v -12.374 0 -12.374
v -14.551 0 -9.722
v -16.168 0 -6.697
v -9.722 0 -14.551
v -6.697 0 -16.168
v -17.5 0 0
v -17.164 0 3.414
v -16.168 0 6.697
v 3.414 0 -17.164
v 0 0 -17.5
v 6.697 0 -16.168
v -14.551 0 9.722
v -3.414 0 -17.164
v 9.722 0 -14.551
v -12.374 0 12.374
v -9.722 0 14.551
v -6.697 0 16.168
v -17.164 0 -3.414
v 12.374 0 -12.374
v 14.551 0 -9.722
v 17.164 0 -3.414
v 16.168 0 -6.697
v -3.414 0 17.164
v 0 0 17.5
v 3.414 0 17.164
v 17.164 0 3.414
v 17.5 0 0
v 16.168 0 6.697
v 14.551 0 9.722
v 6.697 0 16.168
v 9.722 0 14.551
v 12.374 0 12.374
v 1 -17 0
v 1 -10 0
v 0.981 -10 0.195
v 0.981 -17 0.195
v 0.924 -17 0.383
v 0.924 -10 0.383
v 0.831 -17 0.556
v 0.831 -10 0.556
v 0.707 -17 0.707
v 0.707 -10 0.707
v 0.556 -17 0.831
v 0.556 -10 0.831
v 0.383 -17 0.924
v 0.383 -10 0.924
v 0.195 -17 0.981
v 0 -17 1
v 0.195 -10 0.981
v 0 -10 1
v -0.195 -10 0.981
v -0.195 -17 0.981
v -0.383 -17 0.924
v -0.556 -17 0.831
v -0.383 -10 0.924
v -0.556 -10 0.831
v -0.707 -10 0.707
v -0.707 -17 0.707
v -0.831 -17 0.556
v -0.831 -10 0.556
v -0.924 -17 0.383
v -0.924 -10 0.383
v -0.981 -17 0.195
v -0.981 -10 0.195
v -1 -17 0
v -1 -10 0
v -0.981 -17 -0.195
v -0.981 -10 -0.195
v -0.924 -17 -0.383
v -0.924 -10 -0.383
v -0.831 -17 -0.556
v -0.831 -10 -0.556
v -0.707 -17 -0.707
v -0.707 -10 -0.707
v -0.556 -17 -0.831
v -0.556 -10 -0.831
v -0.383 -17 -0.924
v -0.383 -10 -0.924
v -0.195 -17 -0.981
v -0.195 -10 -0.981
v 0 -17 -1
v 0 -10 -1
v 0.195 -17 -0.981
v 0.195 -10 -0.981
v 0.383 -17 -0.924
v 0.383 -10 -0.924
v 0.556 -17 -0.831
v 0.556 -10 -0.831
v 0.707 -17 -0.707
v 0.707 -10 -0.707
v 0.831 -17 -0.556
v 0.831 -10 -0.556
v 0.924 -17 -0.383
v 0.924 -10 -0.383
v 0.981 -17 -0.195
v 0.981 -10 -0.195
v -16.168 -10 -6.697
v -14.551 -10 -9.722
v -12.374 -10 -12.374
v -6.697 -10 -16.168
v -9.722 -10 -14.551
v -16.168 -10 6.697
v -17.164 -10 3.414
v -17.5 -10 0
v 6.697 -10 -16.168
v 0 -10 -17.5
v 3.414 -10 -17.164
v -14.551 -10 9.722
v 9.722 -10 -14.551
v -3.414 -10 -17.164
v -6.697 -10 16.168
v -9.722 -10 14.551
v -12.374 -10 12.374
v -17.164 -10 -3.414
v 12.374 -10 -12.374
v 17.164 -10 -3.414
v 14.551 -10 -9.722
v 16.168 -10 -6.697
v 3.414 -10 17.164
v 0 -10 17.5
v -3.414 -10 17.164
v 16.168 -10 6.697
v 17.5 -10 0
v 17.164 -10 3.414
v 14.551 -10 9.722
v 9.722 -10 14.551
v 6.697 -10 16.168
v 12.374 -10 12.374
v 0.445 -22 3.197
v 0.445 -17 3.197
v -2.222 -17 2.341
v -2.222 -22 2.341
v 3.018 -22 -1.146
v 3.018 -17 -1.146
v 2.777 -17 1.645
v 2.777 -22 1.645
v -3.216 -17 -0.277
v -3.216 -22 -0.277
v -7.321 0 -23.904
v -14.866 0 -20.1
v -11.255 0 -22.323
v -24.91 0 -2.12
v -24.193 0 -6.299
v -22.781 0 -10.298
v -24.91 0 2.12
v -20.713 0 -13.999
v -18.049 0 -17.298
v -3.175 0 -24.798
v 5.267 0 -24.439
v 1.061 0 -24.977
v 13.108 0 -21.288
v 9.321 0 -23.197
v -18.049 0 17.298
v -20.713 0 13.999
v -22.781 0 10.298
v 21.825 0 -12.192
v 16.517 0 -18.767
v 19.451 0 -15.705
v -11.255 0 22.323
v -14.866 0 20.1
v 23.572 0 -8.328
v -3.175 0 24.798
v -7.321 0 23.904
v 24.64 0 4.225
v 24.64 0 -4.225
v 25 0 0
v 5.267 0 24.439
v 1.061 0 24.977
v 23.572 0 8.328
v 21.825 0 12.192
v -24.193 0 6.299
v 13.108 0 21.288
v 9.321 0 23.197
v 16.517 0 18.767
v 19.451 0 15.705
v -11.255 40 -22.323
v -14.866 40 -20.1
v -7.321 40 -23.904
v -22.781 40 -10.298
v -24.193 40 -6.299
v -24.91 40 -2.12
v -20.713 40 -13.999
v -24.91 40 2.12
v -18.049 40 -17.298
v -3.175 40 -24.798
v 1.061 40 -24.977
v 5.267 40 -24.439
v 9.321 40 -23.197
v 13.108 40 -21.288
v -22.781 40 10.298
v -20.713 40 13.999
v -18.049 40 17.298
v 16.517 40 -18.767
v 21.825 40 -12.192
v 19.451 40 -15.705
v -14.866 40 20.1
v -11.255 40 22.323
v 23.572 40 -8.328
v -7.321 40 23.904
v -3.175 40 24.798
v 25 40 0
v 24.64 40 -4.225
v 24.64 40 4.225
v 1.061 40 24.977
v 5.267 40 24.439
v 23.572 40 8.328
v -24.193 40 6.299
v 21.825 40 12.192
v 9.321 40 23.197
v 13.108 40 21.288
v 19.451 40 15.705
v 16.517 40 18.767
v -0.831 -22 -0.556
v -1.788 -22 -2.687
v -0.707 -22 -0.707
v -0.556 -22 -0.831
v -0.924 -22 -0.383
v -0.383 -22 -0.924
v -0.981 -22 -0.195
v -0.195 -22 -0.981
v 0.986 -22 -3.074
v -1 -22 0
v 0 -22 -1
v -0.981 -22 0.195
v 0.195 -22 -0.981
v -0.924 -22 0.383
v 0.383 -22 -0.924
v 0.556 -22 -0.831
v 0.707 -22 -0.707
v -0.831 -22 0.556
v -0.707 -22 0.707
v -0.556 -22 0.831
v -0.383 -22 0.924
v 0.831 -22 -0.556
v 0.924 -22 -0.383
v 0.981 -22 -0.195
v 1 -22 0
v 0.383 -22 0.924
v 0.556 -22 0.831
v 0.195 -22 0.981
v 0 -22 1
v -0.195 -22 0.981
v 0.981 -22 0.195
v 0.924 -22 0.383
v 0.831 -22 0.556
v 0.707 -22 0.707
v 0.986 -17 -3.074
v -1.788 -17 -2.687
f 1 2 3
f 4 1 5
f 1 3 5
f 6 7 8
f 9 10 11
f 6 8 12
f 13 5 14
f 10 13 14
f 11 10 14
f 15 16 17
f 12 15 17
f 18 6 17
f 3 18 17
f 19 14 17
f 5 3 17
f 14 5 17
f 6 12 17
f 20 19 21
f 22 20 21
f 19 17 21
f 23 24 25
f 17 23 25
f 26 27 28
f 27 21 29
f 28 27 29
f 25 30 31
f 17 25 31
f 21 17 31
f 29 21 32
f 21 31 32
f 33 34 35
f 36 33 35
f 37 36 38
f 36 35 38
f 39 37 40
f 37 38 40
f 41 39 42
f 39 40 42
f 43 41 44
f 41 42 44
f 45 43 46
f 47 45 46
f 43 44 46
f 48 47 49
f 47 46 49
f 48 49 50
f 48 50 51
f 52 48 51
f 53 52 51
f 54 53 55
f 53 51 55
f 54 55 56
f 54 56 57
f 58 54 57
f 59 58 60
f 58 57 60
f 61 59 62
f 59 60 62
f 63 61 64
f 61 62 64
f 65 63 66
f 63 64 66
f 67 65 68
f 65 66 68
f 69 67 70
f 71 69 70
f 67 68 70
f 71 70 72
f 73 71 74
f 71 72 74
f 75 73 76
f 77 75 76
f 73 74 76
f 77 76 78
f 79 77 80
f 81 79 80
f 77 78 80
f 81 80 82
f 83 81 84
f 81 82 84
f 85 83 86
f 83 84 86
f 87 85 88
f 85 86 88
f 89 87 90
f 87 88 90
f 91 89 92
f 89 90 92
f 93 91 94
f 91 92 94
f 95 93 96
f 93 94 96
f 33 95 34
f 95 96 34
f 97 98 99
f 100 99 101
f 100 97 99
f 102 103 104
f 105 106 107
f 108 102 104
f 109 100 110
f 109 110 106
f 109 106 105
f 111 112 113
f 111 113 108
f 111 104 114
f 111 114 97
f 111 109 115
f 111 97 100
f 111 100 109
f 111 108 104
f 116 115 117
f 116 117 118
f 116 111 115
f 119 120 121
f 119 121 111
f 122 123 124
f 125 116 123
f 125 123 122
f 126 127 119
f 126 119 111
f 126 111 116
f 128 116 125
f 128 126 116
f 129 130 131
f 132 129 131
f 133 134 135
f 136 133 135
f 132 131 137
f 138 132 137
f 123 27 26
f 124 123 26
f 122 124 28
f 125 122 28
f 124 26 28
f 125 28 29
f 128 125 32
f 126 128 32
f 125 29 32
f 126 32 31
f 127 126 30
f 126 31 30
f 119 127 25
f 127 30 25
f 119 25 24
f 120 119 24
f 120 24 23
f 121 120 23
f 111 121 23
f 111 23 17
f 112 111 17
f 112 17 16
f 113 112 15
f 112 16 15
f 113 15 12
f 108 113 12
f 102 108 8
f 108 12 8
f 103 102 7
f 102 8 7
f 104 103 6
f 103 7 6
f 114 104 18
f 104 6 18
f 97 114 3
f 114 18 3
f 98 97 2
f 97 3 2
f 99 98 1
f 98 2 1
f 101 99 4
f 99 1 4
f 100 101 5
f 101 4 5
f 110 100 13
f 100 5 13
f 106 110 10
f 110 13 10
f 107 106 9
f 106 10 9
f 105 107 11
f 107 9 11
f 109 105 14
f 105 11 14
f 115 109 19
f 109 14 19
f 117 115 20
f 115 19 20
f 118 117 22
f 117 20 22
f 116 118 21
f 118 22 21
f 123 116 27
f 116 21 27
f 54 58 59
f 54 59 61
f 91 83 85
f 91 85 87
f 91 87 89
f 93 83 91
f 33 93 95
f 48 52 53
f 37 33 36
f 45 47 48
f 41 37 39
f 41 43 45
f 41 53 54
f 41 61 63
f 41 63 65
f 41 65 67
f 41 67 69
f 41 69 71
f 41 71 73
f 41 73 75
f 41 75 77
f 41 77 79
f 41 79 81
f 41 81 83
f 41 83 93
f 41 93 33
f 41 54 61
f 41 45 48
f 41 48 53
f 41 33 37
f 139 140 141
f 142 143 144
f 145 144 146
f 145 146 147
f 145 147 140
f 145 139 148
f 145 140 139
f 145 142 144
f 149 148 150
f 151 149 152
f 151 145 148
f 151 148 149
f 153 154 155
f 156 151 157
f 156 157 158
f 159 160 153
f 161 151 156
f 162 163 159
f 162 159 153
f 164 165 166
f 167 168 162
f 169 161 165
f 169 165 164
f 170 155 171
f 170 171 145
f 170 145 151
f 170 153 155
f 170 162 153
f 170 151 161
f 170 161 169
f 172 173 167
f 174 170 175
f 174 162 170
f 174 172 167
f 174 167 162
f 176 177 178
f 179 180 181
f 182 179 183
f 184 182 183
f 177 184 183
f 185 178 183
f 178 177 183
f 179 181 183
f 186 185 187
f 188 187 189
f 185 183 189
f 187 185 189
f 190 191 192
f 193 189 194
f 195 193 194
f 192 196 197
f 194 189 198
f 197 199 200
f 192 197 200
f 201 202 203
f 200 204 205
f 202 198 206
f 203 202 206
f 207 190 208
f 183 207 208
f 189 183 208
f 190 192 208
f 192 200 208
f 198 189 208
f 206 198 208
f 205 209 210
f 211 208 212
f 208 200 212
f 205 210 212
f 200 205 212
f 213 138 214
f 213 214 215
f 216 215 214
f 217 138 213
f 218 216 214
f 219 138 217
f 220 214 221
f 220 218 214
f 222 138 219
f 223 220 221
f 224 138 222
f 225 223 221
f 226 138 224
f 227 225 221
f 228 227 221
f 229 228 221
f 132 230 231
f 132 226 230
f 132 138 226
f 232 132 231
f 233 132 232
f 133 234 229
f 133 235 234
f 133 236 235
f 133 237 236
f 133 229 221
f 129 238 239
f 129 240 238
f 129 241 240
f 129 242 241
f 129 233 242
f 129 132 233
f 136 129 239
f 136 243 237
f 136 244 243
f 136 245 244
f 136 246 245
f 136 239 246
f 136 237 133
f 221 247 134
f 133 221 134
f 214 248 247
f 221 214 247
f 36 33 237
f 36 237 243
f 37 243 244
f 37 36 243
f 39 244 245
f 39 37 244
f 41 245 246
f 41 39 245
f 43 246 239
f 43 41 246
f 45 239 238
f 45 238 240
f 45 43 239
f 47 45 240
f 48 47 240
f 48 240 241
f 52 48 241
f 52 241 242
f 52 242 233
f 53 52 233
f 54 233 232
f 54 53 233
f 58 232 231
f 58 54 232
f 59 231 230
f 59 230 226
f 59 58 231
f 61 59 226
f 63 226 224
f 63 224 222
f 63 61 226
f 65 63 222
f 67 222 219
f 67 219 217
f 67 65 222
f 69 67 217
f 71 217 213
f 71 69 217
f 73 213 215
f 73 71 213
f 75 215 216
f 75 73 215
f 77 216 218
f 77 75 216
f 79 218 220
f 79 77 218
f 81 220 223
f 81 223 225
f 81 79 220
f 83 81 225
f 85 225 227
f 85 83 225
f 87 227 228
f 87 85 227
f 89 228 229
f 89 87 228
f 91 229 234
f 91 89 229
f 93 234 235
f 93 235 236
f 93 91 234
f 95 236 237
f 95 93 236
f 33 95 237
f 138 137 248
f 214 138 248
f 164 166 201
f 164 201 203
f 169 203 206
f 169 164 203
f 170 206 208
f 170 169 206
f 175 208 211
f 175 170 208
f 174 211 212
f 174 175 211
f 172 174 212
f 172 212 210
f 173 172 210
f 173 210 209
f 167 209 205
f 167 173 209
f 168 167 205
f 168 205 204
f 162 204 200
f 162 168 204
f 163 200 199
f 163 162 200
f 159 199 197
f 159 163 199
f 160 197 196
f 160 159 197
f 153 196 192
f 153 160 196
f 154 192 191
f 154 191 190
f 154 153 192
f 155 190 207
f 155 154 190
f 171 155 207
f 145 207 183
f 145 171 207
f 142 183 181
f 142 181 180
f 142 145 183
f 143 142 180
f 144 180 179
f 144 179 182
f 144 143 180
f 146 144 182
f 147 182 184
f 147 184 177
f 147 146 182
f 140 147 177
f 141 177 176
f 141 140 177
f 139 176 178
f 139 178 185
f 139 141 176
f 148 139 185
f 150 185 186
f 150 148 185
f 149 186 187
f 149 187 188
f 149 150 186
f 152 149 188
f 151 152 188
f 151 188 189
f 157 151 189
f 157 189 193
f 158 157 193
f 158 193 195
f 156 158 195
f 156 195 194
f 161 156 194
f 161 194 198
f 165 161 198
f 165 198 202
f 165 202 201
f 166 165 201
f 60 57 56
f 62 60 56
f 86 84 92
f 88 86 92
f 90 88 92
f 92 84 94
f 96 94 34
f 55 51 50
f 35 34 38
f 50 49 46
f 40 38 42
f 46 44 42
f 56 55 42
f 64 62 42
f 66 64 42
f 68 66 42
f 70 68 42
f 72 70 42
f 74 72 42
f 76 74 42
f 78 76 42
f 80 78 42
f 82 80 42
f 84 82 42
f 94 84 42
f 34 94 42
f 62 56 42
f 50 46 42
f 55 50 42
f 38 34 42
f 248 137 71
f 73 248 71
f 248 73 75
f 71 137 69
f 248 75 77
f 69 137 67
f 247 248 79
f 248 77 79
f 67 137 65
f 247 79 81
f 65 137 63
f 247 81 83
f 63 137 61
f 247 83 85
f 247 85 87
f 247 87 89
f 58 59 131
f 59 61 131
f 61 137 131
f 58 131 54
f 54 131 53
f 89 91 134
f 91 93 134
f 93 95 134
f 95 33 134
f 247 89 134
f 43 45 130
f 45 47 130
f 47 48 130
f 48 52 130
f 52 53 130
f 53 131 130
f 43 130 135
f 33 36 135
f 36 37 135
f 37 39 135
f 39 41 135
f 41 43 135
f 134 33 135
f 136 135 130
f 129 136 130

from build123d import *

# Parameters (mm, degrees)
F0_R     = 25
F1_DEPTH = 40
F2_R     = 17.5
F3_DEPTH = 10
F4_R     = 1
F5_DEPTH = 7
F6_R     = 1
F7_DEPTH = 5


with BuildPart() as f1:
    # F0 (on Front) → F1 (new body)
    with BuildSketch(Plane.XZ):
        Circle(F0_R)
    extrude(amount=-F1_DEPTH)


with BuildPart() as f3:
    # F2 (on Front) → F3 (new body)
    with BuildSketch(Plane.XZ):
        Circle(F2_R)
    extrude(amount=F3_DEPTH)


with BuildPart() as f5:
    # F4 (on face) → F5 (new body)
    with BuildSketch(Plane.XZ.offset(10)):
        Circle(F4_R)
    extrude(amount=F5_DEPTH)


with BuildPart() as f7:
    # F6 (on face) → F7 (new body)
    with BuildSketch(Plane.XZ.offset(17)):
        Polygon((2.77722, 1.645202), (0.445297, 3.197085), (-2.221943, 2.341497), (-3.216015, -0.277286), (-1.788362, -2.687267), (0.985964, -3.073681), (3.017839, -1.145551), align=None)
        Circle(F6_R, mode=Mode.SUBTRACT)
    extrude(amount=F7_DEPTH)


solid = Compound([f1.part, f3.part, f5.part, f7.part])
